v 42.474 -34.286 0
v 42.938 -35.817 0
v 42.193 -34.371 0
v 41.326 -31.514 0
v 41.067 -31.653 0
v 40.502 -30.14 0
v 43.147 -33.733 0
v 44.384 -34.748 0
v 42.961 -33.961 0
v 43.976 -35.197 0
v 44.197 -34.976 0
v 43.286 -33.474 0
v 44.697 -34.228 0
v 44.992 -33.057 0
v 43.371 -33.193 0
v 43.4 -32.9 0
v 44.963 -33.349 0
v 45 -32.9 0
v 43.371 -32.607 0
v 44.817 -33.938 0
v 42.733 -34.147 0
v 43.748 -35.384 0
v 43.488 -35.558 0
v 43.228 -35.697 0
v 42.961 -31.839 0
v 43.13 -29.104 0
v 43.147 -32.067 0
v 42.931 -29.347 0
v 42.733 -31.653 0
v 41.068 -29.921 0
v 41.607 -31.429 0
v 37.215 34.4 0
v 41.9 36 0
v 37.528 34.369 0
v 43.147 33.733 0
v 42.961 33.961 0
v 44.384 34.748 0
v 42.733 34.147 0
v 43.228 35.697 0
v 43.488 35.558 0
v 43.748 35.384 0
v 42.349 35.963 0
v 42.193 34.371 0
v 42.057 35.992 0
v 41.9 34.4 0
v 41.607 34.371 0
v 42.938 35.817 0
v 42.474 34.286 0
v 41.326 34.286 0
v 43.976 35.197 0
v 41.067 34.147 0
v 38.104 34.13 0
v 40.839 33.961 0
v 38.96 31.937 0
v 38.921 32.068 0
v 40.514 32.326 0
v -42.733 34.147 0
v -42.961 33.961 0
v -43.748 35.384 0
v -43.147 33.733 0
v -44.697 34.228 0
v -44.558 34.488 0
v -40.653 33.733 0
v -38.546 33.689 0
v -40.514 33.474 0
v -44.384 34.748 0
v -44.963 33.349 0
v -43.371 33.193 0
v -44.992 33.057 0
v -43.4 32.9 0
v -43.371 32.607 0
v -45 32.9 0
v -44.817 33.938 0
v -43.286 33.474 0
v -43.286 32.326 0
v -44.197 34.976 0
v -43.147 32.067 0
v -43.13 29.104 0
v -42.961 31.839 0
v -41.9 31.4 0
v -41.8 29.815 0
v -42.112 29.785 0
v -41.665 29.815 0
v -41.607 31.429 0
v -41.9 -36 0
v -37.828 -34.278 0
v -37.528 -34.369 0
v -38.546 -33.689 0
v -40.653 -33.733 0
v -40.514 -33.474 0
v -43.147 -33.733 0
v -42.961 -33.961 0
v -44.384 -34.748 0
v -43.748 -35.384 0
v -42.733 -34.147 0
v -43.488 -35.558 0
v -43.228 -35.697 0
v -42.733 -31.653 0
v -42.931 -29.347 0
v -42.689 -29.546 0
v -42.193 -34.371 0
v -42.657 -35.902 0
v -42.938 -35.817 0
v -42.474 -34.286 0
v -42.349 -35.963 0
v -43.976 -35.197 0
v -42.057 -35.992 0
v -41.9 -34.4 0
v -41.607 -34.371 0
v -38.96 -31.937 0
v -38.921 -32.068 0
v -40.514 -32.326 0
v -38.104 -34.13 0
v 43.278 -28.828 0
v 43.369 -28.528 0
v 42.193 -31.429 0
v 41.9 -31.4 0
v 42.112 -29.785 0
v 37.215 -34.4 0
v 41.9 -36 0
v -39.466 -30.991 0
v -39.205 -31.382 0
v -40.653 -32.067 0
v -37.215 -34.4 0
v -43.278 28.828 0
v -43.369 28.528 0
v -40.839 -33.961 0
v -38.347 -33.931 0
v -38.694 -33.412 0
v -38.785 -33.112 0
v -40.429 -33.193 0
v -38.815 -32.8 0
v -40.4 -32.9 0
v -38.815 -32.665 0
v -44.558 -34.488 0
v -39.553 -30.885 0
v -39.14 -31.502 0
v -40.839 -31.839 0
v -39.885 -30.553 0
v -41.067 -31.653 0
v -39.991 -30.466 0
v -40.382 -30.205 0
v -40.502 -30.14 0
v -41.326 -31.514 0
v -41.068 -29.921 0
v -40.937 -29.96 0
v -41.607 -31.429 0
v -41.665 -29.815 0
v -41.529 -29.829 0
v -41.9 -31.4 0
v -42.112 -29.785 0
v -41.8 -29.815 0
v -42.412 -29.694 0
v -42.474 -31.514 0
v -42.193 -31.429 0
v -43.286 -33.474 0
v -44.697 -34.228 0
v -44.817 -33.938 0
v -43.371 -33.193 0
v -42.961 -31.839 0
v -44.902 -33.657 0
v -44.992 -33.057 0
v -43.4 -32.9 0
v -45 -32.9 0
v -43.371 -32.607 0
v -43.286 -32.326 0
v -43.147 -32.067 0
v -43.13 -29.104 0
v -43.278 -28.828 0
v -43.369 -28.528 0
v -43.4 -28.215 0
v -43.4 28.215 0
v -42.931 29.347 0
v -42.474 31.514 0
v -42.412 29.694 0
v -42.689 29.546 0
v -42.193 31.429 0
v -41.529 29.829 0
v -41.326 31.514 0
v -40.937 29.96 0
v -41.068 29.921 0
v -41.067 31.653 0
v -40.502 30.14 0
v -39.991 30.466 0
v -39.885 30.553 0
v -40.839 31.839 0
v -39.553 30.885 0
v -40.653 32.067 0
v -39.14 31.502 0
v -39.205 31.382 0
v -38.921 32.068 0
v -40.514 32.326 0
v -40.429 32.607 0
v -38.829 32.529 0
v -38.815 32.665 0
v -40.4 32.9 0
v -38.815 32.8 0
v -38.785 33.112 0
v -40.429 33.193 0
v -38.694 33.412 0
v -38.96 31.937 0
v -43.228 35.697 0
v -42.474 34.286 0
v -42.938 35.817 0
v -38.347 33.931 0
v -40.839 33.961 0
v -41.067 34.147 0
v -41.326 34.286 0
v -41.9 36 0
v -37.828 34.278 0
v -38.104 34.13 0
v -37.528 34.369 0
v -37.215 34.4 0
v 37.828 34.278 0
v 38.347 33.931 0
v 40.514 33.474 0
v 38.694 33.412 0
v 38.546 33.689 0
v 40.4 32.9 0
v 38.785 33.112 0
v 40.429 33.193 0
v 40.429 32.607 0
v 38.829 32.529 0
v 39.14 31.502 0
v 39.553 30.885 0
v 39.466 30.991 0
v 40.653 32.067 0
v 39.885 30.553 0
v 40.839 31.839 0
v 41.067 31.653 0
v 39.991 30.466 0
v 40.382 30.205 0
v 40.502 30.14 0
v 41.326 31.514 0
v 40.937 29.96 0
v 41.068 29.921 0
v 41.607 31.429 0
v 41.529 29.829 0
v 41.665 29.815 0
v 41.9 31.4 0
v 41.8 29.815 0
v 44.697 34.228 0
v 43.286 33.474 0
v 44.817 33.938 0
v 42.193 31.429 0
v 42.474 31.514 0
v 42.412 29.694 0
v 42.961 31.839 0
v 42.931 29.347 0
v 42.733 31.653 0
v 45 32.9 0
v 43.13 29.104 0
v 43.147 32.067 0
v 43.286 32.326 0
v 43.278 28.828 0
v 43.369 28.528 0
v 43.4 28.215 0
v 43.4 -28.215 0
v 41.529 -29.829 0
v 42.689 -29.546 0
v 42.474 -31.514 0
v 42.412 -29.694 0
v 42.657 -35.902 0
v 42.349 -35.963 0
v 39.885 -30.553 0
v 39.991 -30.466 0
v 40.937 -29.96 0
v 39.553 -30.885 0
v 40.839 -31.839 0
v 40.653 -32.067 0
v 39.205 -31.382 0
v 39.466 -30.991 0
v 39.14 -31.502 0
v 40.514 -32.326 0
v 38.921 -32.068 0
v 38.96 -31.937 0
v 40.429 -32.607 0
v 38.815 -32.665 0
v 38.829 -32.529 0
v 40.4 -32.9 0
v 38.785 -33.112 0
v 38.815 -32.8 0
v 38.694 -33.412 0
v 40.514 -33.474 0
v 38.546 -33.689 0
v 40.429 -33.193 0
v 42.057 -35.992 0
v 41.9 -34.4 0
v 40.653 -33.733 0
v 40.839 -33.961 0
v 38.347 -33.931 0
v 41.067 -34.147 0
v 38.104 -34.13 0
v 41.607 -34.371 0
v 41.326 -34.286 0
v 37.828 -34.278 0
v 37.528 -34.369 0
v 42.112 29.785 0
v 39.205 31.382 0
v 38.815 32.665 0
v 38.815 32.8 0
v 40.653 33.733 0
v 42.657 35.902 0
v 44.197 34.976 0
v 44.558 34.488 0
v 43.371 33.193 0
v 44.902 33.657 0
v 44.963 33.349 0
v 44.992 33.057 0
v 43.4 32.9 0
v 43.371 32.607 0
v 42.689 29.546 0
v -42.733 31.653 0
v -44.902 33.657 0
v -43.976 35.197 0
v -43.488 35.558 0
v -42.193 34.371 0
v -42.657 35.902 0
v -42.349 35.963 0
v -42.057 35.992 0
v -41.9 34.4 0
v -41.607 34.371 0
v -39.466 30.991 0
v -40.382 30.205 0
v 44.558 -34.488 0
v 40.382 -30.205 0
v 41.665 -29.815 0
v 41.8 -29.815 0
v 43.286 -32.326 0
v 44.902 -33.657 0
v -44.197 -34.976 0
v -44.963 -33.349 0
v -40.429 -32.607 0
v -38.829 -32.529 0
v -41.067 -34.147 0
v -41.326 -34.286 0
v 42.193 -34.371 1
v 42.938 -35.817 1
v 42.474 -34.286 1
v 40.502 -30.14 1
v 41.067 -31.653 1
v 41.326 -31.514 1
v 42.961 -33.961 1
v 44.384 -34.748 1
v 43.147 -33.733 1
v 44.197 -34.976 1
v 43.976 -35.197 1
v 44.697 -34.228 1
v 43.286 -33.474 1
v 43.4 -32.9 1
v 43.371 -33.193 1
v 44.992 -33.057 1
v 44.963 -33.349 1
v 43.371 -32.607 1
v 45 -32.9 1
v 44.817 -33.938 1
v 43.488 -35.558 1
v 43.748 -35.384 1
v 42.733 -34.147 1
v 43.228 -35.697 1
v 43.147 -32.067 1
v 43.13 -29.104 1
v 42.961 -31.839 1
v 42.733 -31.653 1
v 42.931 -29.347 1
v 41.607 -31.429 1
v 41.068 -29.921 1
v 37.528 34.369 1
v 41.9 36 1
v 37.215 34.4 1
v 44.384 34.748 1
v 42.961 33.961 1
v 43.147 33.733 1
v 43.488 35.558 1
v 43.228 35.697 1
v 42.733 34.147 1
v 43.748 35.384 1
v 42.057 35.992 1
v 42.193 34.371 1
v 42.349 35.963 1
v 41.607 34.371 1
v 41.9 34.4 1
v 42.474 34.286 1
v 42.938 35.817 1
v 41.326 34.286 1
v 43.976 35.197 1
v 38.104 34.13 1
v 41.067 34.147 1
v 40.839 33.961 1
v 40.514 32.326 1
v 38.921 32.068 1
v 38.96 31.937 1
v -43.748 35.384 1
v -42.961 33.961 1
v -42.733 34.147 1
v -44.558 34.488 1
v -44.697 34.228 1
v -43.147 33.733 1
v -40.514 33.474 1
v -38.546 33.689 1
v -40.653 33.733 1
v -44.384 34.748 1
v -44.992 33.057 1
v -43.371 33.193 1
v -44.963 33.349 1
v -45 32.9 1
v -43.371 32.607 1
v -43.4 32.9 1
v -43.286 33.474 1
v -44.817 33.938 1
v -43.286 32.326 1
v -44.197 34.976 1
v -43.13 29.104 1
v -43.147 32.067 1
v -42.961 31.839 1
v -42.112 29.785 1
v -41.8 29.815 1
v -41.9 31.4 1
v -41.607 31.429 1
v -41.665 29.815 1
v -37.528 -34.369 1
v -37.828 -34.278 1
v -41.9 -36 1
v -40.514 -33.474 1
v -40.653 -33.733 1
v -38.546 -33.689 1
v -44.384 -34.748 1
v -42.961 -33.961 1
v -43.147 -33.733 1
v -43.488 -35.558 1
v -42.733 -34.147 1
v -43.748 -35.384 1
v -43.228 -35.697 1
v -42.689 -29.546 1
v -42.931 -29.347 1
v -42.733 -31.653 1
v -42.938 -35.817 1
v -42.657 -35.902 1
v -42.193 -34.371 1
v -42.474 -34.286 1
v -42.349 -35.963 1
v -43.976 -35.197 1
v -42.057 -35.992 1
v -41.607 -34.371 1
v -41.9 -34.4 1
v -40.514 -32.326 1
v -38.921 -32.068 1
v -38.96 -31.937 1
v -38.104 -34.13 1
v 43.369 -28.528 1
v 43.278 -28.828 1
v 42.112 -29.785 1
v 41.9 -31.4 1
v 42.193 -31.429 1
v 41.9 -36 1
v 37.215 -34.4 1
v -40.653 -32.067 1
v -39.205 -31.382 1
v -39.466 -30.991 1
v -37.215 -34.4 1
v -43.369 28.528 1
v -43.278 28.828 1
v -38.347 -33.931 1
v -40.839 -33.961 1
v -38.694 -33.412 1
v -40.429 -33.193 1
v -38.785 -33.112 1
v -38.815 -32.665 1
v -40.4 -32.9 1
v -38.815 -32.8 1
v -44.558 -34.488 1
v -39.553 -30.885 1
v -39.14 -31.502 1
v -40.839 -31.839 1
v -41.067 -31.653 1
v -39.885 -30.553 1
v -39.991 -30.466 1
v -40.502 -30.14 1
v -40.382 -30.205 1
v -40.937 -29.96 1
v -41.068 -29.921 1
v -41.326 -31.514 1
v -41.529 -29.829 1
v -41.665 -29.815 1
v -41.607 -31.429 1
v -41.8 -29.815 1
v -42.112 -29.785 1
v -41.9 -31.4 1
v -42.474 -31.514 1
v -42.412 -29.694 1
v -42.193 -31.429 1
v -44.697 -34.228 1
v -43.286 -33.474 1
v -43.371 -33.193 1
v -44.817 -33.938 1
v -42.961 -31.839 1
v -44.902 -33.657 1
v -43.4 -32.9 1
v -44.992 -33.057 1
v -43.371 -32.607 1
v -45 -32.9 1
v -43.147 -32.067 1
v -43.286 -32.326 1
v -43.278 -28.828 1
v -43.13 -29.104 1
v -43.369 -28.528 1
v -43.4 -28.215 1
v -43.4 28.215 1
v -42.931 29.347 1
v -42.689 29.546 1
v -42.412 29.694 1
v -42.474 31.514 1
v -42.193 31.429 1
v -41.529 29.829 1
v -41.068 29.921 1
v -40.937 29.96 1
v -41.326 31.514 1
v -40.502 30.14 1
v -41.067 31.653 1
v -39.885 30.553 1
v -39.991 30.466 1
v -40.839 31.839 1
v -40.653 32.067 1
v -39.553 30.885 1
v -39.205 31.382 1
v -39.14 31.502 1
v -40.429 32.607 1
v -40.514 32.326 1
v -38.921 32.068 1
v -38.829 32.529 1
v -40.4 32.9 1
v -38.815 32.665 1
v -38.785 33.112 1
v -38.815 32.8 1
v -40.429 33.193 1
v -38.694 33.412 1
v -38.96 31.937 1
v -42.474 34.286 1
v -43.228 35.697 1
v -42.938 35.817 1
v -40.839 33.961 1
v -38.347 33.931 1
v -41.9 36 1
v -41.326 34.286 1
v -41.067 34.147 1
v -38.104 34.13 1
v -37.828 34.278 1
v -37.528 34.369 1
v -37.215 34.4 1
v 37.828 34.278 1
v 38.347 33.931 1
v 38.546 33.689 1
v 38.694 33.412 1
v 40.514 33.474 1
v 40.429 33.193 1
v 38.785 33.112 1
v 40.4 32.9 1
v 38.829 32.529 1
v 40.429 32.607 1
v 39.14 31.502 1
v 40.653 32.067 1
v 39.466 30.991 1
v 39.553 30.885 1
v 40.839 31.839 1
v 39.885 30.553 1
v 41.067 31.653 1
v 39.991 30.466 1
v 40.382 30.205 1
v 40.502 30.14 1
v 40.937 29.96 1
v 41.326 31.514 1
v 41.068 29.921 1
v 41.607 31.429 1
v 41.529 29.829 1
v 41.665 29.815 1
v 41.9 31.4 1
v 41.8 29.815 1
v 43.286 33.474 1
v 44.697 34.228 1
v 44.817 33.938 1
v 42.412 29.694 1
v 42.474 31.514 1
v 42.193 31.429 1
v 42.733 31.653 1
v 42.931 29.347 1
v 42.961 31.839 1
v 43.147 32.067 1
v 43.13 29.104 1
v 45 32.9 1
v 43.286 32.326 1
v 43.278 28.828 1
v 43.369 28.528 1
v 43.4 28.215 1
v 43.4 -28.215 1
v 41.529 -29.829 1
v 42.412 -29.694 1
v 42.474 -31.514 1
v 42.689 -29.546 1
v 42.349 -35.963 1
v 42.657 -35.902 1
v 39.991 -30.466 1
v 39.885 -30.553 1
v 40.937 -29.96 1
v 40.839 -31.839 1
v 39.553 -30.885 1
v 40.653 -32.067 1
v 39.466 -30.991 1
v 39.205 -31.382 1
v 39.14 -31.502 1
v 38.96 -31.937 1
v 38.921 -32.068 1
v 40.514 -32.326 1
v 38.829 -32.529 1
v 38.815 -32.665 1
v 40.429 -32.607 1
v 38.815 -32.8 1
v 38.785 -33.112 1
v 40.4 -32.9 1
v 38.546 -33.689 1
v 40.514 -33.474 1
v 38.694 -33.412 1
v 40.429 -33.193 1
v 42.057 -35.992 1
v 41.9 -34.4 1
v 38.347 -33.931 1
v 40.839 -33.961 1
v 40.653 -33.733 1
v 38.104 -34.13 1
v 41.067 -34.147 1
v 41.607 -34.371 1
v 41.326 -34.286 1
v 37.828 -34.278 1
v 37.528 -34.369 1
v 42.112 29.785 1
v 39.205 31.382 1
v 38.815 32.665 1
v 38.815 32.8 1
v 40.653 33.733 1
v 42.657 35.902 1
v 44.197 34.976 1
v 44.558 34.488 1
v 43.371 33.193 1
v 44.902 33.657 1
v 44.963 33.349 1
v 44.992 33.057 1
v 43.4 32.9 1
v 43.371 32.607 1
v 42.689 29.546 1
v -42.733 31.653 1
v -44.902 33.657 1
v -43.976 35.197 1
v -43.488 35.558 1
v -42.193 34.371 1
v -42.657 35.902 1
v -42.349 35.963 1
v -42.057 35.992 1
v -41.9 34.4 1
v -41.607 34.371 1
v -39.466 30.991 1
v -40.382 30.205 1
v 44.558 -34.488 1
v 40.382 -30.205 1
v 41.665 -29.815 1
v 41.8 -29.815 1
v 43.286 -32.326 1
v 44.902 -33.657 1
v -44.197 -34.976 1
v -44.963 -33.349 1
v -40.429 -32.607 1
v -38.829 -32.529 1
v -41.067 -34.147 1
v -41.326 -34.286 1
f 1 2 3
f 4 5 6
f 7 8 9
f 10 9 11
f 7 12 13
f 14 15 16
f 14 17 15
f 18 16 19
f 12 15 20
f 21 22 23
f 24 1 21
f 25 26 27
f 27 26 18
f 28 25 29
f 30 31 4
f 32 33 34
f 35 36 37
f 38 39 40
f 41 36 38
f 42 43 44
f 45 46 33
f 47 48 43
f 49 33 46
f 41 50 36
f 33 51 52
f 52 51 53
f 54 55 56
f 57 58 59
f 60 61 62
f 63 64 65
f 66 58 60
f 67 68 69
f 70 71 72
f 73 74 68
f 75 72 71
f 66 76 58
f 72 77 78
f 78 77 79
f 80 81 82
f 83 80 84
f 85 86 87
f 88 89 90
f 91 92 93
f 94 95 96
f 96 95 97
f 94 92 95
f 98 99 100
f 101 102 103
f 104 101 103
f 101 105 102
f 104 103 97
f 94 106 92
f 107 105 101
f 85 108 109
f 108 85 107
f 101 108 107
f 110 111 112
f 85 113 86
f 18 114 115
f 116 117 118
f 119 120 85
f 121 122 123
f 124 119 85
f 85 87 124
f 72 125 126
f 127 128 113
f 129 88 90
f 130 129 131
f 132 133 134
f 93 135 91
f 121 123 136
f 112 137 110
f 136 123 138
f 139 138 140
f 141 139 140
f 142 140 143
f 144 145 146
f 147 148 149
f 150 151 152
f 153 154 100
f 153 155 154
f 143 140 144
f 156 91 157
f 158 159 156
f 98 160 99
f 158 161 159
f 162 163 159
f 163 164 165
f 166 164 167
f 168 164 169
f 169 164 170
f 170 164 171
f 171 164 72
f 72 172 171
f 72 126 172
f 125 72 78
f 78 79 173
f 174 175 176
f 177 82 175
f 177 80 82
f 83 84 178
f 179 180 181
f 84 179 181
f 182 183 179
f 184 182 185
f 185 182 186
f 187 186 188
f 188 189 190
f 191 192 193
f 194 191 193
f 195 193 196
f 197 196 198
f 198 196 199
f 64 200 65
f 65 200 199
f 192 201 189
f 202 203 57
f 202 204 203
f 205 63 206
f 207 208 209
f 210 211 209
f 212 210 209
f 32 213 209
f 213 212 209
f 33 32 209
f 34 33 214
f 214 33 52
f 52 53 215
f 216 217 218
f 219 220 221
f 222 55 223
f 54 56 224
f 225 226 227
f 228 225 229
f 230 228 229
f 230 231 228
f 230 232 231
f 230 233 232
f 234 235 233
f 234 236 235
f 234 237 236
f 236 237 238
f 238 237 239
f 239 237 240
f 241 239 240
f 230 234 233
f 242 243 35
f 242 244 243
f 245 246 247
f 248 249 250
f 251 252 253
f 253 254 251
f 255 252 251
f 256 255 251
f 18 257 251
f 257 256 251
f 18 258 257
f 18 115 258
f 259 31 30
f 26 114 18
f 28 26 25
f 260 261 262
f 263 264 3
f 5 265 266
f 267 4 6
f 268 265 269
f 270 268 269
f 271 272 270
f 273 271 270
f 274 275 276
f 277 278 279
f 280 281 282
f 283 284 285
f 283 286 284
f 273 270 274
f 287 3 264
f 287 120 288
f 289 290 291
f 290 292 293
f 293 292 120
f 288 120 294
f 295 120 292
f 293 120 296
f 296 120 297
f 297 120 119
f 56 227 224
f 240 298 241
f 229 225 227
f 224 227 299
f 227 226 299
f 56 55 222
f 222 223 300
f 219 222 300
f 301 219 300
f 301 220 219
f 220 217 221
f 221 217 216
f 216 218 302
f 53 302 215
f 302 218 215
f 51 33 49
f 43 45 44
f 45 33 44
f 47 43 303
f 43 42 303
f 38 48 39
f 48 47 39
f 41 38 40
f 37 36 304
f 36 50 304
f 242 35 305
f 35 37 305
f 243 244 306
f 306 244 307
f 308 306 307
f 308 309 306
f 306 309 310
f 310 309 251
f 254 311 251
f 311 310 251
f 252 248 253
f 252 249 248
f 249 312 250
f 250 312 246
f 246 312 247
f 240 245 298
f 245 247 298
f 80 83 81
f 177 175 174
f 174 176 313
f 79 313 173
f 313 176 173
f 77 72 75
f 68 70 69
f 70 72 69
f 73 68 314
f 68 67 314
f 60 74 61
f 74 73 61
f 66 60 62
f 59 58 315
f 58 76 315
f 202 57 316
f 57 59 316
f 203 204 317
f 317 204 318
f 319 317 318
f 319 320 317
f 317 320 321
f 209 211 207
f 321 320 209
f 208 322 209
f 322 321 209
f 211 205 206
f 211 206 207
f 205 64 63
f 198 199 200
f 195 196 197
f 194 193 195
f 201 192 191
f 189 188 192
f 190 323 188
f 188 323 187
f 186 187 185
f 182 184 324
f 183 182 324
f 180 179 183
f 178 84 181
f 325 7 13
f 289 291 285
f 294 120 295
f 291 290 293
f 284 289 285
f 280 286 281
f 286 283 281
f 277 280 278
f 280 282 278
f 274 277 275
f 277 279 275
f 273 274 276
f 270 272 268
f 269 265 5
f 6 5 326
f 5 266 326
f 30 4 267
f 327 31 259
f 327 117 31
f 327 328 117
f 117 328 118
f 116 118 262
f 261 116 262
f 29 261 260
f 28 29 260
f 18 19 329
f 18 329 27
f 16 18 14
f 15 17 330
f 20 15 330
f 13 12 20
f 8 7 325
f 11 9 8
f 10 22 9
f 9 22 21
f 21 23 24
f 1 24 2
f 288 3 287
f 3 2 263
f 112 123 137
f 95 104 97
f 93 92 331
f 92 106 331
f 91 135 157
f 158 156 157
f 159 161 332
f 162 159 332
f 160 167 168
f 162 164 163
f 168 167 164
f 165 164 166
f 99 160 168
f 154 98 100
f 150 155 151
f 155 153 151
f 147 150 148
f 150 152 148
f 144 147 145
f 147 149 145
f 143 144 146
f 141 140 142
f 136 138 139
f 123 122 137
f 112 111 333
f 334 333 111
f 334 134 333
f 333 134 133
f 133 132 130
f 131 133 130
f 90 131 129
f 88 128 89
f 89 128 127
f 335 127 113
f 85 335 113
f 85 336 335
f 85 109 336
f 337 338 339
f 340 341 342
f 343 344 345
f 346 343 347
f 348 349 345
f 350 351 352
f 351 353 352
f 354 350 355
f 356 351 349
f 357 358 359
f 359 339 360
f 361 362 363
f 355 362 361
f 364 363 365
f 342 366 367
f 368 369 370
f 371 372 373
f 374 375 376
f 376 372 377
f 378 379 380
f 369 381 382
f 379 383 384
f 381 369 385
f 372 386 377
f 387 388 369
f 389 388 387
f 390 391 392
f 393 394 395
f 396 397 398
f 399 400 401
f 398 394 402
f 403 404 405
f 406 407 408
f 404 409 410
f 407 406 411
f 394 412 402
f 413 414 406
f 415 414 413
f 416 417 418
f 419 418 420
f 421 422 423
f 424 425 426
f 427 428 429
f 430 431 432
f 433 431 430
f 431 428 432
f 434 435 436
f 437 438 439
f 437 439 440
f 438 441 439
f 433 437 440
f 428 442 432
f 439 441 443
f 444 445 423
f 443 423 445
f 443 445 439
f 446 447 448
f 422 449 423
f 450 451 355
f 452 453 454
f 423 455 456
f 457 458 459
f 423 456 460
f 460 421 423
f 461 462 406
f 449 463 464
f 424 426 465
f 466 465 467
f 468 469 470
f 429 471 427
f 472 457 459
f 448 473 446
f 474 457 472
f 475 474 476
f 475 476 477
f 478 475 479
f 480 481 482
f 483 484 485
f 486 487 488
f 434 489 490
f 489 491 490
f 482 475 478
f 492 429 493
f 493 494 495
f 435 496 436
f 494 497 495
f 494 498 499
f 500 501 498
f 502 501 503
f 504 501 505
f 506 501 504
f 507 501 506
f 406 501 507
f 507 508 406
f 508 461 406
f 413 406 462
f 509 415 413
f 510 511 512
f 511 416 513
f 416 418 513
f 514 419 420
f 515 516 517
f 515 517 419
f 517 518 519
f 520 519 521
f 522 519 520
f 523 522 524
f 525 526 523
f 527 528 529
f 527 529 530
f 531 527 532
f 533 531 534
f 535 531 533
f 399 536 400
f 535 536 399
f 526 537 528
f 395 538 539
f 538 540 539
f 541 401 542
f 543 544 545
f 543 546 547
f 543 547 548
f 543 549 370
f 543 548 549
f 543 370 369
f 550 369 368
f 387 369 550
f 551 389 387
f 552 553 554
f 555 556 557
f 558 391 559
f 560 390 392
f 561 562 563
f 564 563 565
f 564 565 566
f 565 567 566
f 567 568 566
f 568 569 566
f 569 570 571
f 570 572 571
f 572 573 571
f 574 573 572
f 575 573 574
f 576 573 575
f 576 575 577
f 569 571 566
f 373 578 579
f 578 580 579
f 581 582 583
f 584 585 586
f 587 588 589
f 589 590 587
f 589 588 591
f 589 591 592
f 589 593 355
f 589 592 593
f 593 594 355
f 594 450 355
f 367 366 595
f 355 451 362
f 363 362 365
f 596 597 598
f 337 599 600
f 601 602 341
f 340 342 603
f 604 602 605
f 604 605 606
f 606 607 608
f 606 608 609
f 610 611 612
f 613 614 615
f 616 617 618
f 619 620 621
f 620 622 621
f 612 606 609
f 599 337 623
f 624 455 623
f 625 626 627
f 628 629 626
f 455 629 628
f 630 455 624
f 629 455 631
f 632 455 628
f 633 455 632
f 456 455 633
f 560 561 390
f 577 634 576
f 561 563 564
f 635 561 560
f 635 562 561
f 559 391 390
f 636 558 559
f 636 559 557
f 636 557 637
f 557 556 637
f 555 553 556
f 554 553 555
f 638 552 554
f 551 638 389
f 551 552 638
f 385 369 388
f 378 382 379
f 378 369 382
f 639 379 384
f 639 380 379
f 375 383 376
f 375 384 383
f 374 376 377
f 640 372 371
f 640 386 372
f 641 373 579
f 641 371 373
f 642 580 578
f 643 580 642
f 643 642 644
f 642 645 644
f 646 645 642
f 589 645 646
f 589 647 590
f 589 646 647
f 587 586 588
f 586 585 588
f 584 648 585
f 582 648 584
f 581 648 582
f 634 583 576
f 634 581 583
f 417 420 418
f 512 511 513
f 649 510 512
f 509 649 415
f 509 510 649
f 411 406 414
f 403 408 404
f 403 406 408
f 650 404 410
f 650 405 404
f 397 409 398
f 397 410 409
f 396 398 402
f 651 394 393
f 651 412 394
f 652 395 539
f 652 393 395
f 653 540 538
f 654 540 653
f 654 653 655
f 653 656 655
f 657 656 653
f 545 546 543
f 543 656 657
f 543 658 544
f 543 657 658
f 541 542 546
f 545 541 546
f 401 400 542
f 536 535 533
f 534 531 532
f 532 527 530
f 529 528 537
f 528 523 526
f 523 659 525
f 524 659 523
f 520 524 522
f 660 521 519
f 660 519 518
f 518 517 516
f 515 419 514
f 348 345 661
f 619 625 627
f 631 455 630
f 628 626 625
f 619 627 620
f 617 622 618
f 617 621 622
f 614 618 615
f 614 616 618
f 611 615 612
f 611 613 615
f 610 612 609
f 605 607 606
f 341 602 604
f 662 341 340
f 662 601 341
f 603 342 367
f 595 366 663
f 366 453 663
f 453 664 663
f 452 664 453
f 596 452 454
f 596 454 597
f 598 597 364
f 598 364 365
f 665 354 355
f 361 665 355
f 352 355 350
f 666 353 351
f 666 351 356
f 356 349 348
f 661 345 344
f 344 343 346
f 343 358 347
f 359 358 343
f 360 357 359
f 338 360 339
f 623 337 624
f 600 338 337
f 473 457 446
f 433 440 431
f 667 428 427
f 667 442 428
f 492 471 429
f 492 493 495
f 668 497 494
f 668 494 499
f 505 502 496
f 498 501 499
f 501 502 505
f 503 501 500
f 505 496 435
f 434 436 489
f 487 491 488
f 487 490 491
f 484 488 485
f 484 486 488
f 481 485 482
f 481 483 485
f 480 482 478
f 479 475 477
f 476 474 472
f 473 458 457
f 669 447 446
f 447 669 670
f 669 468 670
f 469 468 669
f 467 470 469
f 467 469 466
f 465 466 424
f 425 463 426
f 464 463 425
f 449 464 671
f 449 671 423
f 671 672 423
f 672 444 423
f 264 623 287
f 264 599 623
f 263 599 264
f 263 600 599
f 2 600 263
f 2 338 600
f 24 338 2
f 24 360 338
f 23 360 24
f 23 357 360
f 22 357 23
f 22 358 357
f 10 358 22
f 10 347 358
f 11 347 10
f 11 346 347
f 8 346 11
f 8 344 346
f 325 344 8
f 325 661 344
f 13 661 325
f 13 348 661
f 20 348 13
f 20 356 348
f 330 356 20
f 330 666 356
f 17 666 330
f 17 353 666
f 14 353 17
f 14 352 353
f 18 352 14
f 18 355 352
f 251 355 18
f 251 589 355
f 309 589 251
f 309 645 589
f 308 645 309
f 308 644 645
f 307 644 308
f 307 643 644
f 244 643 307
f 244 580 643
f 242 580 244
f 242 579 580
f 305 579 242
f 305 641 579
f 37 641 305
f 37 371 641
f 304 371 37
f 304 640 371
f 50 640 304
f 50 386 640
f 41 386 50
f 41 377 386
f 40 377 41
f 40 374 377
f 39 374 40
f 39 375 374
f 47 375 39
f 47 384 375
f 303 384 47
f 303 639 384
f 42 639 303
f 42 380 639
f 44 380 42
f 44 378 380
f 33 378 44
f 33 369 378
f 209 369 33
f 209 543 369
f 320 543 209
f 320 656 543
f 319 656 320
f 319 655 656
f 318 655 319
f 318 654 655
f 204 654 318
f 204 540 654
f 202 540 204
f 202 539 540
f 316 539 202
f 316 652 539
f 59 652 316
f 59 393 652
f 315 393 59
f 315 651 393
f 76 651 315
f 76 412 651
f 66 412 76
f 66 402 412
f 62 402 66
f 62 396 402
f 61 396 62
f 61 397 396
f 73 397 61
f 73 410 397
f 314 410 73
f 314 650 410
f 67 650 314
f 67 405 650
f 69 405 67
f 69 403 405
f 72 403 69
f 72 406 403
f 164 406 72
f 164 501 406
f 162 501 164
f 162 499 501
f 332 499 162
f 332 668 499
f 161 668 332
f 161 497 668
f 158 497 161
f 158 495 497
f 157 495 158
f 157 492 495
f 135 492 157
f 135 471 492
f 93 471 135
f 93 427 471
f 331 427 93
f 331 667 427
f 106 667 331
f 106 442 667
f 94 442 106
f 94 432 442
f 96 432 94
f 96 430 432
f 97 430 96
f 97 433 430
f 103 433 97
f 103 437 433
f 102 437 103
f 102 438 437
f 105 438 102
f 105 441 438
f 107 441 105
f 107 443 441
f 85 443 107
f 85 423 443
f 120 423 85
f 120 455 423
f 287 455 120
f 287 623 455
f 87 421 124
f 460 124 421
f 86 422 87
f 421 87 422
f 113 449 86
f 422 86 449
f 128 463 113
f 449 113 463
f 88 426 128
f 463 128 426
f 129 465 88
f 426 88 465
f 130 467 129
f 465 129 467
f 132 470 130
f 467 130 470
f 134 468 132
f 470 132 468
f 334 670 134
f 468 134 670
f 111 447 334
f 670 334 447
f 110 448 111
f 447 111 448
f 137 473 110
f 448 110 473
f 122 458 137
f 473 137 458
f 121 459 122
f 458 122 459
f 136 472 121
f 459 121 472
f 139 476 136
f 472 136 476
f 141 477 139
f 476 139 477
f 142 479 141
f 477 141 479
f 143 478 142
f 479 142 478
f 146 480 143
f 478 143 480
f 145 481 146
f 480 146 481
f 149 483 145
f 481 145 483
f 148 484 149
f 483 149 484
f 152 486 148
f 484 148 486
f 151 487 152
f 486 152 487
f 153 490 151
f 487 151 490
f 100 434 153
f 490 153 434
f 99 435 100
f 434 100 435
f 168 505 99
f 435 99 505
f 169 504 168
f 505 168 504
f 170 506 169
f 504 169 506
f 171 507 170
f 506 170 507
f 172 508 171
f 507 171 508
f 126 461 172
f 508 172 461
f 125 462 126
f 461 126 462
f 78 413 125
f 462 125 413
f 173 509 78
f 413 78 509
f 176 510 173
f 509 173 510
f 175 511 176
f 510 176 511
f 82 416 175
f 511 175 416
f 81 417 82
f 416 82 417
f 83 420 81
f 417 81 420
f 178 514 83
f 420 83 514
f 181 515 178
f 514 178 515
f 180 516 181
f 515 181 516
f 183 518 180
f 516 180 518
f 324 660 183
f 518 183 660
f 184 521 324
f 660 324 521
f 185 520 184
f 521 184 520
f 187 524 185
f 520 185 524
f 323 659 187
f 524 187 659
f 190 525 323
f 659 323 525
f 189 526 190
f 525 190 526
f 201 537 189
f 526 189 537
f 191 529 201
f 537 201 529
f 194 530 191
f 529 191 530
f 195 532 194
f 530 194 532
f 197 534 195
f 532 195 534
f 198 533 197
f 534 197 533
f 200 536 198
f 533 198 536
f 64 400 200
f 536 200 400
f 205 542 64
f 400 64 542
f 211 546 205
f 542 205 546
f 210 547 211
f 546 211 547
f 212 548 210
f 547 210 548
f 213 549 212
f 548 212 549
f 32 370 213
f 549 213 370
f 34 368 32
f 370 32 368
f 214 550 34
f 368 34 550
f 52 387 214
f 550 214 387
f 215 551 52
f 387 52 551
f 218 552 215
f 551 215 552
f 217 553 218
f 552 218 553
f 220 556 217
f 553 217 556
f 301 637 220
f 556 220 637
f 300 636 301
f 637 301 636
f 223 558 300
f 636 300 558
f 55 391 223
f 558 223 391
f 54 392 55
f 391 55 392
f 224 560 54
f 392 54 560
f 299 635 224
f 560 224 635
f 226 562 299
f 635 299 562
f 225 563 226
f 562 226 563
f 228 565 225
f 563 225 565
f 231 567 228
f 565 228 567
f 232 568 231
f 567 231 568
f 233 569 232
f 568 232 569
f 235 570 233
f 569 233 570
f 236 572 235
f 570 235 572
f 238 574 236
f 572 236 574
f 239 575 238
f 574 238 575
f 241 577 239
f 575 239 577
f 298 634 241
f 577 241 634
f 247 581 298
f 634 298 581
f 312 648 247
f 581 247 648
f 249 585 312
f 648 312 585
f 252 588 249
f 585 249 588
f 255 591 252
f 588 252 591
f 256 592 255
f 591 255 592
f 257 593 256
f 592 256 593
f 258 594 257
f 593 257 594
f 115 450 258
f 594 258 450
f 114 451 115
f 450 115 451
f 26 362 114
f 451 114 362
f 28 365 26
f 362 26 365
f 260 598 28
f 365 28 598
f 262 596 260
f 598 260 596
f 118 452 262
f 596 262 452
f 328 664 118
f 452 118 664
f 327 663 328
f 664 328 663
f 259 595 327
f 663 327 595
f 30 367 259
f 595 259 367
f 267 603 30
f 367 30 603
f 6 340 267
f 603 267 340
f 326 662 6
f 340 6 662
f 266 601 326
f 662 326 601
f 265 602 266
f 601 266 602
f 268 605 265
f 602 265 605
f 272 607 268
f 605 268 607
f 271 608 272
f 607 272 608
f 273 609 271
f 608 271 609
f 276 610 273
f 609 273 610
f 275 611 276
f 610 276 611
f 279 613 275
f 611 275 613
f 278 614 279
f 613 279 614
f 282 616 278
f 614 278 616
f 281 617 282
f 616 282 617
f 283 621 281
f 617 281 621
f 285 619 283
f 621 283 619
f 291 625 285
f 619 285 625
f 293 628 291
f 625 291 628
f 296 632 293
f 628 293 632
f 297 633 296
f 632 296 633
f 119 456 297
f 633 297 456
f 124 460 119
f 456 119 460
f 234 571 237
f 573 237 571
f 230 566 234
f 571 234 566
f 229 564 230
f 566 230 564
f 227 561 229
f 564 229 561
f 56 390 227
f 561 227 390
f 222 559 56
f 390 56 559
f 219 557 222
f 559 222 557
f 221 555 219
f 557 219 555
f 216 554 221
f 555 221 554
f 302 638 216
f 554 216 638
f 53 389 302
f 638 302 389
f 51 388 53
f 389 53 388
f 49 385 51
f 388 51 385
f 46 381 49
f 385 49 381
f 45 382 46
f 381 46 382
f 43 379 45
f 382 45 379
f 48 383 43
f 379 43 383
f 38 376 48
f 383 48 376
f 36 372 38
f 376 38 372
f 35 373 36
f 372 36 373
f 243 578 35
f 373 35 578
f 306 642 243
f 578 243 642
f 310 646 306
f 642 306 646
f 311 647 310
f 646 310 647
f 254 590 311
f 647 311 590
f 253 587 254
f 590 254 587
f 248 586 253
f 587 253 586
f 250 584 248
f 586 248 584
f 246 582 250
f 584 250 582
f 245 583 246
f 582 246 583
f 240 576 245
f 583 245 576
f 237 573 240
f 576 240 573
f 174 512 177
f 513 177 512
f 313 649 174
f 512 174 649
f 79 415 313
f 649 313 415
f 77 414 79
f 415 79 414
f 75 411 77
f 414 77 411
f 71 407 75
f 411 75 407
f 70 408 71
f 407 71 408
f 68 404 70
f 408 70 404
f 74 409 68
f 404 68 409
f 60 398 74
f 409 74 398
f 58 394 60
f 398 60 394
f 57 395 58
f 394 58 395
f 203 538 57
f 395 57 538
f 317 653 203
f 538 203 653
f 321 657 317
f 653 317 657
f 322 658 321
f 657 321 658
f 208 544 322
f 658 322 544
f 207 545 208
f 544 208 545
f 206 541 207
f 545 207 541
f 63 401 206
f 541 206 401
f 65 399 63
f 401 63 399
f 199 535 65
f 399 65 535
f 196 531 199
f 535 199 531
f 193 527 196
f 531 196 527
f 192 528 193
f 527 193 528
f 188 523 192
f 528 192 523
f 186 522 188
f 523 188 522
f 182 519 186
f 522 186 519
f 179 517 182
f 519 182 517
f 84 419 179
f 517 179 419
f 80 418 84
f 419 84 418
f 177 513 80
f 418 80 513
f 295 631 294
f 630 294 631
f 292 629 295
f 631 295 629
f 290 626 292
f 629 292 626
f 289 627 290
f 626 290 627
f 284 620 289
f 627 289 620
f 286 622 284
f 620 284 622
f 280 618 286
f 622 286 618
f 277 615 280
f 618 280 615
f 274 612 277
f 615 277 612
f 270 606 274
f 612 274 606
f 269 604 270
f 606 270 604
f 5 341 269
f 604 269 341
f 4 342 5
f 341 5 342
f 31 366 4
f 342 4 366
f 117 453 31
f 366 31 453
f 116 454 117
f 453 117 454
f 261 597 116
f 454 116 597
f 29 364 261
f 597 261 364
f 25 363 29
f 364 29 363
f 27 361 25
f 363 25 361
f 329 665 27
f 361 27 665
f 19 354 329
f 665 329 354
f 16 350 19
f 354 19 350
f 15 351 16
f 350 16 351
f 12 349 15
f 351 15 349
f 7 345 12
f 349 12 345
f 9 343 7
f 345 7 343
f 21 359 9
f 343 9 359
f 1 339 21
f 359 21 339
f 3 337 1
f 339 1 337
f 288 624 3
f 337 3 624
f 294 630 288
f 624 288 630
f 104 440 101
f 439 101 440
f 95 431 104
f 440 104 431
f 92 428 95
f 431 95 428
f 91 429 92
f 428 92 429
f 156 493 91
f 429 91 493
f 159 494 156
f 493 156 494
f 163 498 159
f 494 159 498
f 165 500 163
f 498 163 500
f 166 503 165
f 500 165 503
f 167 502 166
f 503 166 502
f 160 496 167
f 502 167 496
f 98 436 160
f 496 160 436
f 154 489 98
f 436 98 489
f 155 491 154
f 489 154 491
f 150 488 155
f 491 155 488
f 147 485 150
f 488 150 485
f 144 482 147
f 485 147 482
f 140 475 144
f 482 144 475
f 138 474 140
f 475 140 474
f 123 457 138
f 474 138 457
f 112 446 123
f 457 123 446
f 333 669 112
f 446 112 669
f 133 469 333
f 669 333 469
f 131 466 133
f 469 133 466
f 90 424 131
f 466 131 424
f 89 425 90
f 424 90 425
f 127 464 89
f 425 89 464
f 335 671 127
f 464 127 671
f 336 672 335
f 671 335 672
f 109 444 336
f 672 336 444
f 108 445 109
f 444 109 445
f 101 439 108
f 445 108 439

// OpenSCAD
// file: case.scad
// FireLord Device Case

$fn = 32;

solar_panel_len = 160.4;
solar_panel_wid = 138.4;
solar_panel_h = 2.7;

perfboard_len = 90.4;
perfboard_wid = 70.4;
perfboard_thick = 1.6;
perfboard_leeway = 6.0; // spacing under the board
perfboard_hole_dia = 3.0;
// inset distances from each perboard corner
perfboard_hole_corner_x = 1.8+perfboard_hole_dia/2;
perfboard_hole_corner_y = 0.8+perfboard_hole_dia/2;

supercap_dia = 36.1;
supercap_len = 73.3;

lora_screw_shaft_dia = 1.9;
lora_screw_shaft_len = 6.1;
lora_screw_head_dia = 4.0;
lora_screw_head_len = 2.1;
// The LoRa module has three mounting holes in an
// isosceles triangle layout (if they're your vertices)
// These are the holes closest together (the base)
lora_hole_tria_base = 21.8-lora_screw_shaft_dia; // From far hole edge to far hole edge; -dia makes centered.
lora_hole_tria_h = 29.0+lora_screw_shaft_dia/2;
lora_antenna_hole_dia = 2.0;
// Offsets from top-most mount hole to antenna hole
lora_antenna_h_offset_x = -3.7;
lora_antenna_h_offset_y = -2.6;

wall_thick = 1.6;

supercap_clip_h = supercap_dia/6; // How far the clipping portion extends
cap_clip_rounding = 0.7;
cap_clip_section_thick = 4.0;

case_rounding = 4.0;

case_screw_dia = 3.0;

module loraScrewHole2D() {
    circle(d=lora_screw_shaft_dia);
}

module loraScrewHoles2D() {
    translate([-lora_hole_tria_base/2,0])
    circle(d=lora_screw_shaft_dia);
    translate([lora_hole_tria_base/2,0])
    circle(d=lora_screw_shaft_dia);
    translate([0,lora_hole_tria_h]) {
        circle(d=lora_screw_shaft_dia);
        //translate([lora_antenna_h_offset_x,lora_antenna_h_offset_y])
        //circle(d=lora_antenna_hole_dia);
    }
}

module perfboardHole2D() {
    circle(d=perfboard_hole_dia);
}

module perfboardHoles2D() {
    x_val = perfboard_len/2-perfboard_hole_corner_x;
    y_val = perfboard_wid/2-perfboard_hole_corner_y;

    translate([x_val, y_val])
    perfboardHole2D();
    translate([-x_val, y_val])
    perfboardHole2D();
    translate([x_val, -y_val])
    perfboardHole2D();
    translate([-x_val, -y_val])
    perfboardHole2D();
}
//perfboardHoles2D();

module capacitor2D() {
    circle(d=supercap_dia);
}

module capacitorClipDiff2D() {
    difference() {
        capacitor2D();
        translate([0,supercap_dia/2+supercap_clip_h])
        square(supercap_dia, center=true);
    }
}
//capacitorClipDiff2D();

// Side profile
module capacitorClipCircle2D() {
    difference() {
        offset(wall_thick)
        capacitorClipDiff2D();
        translate([0,supercap_dia/2+supercap_clip_h])
        square([supercap_dia+wall_thick*2, supercap_dia], center=true);
    }
}
//capacitorClipCircle2D();

module capacitorClip2D() {
    offset(cap_clip_rounding) offset(-cap_clip_rounding)
    difference() {
        hull() {
            capacitorClipCircle2D();
            translate([0,-supercap_dia/4+supercap_clip_h/2])
            square([supercap_dia+3*wall_thick, supercap_dia/2+supercap_clip_h+wall_thick*2], center=true);
        }
        capacitor2D();
    }
    translate([0,cap_clip_rounding/2-supercap_dia/2-wall_thick])
    square([supercap_dia+3*wall_thick, cap_clip_rounding], center=true);
}
//capacitorClip2D();
// Test translate of the screw hole
//translate([supercap_dia/2+perfboard_hole_dia/2+wall_thick,0])
//#square([perfboard_hole_dia, 10], center=true);

module capacitorClipSection3D() {
    translate([0,cap_clip_section_thick/2,supercap_dia/2])
    rotate([90,0,0])
    linear_extrude(cap_clip_section_thick)
    capacitorClip2D();
}
capacitorClipSection3D();

//module caseScrewHoles

module caseBodyHollow() {
    difference() {
        linear_extrude(supercap_dia*2)
        offset(case_rounding) offset(-case_rounding)
        square([solar_panel_len+4*wall_thick+2*case_screw_dia, solar_panel_wid+4*wall_thick+2*case_screw_dia], center=true);
        translate([0,0,wall_thick])
        linear_extrude(supercap_dia*2-wall_thick)
        offset(case_rounding) offset(-case_rounding)
        square([solar_panel_len, solar_panel_wid], center=true);
    }
}

//caseBodyHollow();
// main file
// FireLord Device Case

use <case.scad>;


$fn = 32;

module holeTestifyHelper() {
    difference() {
        offset(1.6)
        hull() {
            children();
        }
        children();
    }
}

module holeTestify() {
    linear_extrude(1.0)
    difference() {
        holeTestifyHelper() children();
        
        offset(1.6) offset(-1.6*2)
        holeTestifyHelper() children();
    }
}

// To be printed in vase mode
module capacitorTest3D() {
    linear_extrude(73.3+0.4)
    offset(0.4)
    capacitor2D();
    
    
}
//capacitorTest3D();

// Small prints to test if the hole spacing/sizes are correct
//holeTestify() loraScrewHoles2D();
holeTestify() perfboardHoles2D();
